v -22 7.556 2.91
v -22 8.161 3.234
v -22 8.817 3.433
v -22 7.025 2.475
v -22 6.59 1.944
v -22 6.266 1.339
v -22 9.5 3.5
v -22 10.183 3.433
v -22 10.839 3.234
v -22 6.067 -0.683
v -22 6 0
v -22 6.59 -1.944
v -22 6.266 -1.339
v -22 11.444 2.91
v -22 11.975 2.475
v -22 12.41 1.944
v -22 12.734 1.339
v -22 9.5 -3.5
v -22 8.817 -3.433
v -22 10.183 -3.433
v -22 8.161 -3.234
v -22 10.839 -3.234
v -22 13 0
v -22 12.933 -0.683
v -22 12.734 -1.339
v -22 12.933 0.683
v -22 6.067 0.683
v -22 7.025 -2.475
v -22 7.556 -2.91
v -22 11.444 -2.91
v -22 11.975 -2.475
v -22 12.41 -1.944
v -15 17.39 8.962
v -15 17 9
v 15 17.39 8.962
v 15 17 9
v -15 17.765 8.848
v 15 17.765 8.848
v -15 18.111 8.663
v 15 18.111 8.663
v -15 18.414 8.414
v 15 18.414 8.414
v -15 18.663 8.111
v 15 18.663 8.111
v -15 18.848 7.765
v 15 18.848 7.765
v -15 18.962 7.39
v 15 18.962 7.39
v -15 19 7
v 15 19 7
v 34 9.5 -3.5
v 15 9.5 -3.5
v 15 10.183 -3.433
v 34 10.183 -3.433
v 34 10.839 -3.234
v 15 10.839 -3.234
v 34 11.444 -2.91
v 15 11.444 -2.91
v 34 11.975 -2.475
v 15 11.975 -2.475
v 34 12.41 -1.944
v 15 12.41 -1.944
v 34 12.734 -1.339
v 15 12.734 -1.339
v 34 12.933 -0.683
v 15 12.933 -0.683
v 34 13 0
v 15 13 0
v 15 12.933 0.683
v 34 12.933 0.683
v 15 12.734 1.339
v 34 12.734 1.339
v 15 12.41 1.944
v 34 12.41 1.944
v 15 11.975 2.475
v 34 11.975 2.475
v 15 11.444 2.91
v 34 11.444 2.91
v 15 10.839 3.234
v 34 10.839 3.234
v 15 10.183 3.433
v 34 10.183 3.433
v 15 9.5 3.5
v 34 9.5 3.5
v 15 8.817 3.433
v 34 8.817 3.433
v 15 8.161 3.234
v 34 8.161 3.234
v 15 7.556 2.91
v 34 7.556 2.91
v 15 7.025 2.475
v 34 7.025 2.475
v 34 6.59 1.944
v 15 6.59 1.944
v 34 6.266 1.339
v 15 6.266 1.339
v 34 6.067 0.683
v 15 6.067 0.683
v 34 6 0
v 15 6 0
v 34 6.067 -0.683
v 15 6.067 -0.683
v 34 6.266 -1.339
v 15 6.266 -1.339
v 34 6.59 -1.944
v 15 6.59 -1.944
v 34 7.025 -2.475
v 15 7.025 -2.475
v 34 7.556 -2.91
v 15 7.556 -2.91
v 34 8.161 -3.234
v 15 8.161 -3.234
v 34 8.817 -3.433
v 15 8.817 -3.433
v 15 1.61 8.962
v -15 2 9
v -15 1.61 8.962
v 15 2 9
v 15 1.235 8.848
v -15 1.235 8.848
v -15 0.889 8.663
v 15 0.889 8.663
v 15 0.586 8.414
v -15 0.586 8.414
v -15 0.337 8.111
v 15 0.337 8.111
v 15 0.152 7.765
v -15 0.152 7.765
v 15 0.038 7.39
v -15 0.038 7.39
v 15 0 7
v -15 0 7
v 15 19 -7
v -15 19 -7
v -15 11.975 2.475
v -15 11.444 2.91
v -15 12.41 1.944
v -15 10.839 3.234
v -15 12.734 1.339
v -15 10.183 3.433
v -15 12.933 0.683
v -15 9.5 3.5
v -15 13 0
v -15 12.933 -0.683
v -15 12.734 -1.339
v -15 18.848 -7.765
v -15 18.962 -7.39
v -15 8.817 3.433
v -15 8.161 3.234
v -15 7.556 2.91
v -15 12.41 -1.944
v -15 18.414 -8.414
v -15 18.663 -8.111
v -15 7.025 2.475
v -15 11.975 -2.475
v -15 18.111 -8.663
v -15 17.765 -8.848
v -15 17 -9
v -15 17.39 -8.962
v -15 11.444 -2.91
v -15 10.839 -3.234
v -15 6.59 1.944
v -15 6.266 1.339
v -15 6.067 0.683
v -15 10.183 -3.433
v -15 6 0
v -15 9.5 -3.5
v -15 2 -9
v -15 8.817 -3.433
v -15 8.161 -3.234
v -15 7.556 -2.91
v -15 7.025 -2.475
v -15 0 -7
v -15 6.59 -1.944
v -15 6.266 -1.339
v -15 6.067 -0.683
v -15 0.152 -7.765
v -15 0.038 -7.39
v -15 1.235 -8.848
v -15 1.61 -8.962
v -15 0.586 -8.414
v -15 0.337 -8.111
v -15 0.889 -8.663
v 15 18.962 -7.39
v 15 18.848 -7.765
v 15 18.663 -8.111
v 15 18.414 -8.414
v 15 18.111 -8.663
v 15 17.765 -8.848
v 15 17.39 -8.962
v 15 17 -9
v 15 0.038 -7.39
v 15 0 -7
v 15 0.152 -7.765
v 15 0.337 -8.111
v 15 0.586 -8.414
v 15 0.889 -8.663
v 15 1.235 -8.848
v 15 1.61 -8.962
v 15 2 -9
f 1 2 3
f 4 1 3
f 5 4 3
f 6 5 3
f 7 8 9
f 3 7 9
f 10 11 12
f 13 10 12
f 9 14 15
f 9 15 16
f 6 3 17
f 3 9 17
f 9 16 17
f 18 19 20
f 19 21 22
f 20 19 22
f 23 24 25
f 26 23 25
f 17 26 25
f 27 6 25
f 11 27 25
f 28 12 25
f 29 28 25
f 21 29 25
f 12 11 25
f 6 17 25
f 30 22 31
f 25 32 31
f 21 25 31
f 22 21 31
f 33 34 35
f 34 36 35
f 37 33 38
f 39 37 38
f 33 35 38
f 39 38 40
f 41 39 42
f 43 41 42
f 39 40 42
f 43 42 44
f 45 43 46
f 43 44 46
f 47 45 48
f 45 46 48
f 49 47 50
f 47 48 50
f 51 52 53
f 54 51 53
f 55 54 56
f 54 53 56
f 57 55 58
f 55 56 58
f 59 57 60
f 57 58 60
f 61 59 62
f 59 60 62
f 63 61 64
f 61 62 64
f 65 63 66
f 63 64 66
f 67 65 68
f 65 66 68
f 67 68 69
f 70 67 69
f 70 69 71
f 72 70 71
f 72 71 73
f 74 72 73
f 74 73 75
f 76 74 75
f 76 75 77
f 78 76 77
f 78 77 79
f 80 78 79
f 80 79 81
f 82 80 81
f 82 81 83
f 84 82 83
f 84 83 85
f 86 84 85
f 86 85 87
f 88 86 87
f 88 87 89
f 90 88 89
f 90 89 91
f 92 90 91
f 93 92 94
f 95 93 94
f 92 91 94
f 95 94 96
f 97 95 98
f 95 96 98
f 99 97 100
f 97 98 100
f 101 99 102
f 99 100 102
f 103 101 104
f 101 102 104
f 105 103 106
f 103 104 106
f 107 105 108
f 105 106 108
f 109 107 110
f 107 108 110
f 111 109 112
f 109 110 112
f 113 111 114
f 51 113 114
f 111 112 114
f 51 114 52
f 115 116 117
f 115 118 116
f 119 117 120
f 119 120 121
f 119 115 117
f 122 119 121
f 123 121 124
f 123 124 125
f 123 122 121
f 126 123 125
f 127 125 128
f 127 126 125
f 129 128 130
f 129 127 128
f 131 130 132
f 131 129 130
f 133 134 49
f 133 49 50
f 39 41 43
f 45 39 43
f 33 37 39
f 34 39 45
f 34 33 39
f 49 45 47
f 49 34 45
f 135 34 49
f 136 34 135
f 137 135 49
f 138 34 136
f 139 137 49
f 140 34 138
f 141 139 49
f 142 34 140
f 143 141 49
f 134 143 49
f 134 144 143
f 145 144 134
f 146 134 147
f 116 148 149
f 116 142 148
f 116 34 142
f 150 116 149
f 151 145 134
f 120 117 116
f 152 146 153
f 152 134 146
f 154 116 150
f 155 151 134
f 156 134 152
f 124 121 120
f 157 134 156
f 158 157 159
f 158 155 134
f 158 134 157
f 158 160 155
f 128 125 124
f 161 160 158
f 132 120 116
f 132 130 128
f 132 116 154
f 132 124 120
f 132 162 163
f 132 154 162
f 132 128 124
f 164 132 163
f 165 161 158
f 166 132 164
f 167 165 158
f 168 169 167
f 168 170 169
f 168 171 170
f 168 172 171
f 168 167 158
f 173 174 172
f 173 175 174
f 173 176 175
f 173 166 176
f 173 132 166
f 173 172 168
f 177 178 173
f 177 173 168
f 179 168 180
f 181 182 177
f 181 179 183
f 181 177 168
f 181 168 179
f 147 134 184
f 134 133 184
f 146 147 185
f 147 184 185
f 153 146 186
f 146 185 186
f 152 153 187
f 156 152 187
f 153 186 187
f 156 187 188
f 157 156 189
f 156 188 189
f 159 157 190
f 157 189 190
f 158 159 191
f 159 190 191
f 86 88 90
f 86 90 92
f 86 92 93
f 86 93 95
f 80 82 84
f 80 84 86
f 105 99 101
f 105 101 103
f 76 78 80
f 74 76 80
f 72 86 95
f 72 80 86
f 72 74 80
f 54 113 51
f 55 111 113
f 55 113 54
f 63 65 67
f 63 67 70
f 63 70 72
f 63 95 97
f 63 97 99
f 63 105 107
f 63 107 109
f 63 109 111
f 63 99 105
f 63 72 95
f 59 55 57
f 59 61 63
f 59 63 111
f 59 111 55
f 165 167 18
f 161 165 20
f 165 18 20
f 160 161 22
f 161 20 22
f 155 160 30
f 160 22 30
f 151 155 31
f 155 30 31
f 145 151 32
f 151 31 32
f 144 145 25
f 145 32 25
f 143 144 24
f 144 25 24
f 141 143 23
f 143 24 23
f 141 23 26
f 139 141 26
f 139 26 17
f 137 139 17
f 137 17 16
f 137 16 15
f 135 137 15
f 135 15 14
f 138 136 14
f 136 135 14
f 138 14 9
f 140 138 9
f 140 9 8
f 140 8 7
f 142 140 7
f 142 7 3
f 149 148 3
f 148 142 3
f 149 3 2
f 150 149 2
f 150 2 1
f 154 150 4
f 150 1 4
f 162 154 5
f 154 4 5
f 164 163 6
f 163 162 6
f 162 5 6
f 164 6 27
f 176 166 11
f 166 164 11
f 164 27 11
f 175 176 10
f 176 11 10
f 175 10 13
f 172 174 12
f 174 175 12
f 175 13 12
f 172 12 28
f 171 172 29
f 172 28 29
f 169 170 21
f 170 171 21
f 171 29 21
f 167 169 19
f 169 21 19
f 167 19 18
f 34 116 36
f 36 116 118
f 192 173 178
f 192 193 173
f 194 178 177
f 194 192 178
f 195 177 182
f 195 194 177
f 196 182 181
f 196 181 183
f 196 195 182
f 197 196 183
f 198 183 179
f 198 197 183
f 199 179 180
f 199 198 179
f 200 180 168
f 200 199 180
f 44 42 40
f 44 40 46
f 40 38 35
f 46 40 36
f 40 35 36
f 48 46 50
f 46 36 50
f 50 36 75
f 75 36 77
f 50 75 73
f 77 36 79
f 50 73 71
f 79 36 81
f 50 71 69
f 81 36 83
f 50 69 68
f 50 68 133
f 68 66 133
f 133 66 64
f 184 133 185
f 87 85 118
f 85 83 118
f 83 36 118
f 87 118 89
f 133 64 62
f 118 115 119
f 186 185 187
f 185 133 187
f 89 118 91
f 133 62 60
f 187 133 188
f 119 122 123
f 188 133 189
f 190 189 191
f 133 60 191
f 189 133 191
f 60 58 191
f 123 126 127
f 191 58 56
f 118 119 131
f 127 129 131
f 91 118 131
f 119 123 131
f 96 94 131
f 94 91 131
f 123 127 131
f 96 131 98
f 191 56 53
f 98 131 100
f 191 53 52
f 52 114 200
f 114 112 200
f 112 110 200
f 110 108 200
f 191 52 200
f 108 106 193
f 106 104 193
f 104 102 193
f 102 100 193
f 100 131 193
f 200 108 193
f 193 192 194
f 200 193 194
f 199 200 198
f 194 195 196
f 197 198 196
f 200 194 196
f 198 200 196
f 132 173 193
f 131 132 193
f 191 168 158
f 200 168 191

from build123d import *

# Parameters (mm, degrees)
SKETCH1_W                = 30
SKETCH1_H                = 18
BOSS_EXTRUDE1_DEPTH      = 19
BOSS_EXTRUDE2_DEPTH      = 19
BOSS_EXTRUDE2_DEPTH_BACK = 37
SKETCH2_R                = 3.5
FILLET1_R                = 2


with BuildPart() as part:
    # Sketch1 → Boss-Extrude1 (new body)
    with BuildSketch(Plane(origin=(0, 0, 0), x_dir=(1, 0, 0), z_dir=(0, 1, 0))):
        Rectangle(SKETCH1_W, SKETCH1_H)
    extrude(amount=BOSS_EXTRUDE1_DEPTH)

    # Sketch2 → Boss-Extrude2 (add, two sides: drawn at the far end of the back side and taken through both)
    with BuildSketch(Plane(origin=(15, 0, 0), x_dir=(0, 0, -1), z_dir=(1, 0, 0)).offset(-BOSS_EXTRUDE2_DEPTH_BACK)):
        with Locations((0, 9.5)):
            Circle(SKETCH2_R)
    extrude(amount=BOSS_EXTRUDE2_DEPTH + BOSS_EXTRUDE2_DEPTH_BACK)

    # Fillet1
    fillet1_edges = [part.edges().sort_by_distance(p)[0] for p in [
        (0, 19, 9),
        (0, 0, 9),
        (0, 0, -9),
        (0, 19, -9),
    ]]
    fillet(fillet1_edges, radius=FILLET1_R)


solid = part.part
